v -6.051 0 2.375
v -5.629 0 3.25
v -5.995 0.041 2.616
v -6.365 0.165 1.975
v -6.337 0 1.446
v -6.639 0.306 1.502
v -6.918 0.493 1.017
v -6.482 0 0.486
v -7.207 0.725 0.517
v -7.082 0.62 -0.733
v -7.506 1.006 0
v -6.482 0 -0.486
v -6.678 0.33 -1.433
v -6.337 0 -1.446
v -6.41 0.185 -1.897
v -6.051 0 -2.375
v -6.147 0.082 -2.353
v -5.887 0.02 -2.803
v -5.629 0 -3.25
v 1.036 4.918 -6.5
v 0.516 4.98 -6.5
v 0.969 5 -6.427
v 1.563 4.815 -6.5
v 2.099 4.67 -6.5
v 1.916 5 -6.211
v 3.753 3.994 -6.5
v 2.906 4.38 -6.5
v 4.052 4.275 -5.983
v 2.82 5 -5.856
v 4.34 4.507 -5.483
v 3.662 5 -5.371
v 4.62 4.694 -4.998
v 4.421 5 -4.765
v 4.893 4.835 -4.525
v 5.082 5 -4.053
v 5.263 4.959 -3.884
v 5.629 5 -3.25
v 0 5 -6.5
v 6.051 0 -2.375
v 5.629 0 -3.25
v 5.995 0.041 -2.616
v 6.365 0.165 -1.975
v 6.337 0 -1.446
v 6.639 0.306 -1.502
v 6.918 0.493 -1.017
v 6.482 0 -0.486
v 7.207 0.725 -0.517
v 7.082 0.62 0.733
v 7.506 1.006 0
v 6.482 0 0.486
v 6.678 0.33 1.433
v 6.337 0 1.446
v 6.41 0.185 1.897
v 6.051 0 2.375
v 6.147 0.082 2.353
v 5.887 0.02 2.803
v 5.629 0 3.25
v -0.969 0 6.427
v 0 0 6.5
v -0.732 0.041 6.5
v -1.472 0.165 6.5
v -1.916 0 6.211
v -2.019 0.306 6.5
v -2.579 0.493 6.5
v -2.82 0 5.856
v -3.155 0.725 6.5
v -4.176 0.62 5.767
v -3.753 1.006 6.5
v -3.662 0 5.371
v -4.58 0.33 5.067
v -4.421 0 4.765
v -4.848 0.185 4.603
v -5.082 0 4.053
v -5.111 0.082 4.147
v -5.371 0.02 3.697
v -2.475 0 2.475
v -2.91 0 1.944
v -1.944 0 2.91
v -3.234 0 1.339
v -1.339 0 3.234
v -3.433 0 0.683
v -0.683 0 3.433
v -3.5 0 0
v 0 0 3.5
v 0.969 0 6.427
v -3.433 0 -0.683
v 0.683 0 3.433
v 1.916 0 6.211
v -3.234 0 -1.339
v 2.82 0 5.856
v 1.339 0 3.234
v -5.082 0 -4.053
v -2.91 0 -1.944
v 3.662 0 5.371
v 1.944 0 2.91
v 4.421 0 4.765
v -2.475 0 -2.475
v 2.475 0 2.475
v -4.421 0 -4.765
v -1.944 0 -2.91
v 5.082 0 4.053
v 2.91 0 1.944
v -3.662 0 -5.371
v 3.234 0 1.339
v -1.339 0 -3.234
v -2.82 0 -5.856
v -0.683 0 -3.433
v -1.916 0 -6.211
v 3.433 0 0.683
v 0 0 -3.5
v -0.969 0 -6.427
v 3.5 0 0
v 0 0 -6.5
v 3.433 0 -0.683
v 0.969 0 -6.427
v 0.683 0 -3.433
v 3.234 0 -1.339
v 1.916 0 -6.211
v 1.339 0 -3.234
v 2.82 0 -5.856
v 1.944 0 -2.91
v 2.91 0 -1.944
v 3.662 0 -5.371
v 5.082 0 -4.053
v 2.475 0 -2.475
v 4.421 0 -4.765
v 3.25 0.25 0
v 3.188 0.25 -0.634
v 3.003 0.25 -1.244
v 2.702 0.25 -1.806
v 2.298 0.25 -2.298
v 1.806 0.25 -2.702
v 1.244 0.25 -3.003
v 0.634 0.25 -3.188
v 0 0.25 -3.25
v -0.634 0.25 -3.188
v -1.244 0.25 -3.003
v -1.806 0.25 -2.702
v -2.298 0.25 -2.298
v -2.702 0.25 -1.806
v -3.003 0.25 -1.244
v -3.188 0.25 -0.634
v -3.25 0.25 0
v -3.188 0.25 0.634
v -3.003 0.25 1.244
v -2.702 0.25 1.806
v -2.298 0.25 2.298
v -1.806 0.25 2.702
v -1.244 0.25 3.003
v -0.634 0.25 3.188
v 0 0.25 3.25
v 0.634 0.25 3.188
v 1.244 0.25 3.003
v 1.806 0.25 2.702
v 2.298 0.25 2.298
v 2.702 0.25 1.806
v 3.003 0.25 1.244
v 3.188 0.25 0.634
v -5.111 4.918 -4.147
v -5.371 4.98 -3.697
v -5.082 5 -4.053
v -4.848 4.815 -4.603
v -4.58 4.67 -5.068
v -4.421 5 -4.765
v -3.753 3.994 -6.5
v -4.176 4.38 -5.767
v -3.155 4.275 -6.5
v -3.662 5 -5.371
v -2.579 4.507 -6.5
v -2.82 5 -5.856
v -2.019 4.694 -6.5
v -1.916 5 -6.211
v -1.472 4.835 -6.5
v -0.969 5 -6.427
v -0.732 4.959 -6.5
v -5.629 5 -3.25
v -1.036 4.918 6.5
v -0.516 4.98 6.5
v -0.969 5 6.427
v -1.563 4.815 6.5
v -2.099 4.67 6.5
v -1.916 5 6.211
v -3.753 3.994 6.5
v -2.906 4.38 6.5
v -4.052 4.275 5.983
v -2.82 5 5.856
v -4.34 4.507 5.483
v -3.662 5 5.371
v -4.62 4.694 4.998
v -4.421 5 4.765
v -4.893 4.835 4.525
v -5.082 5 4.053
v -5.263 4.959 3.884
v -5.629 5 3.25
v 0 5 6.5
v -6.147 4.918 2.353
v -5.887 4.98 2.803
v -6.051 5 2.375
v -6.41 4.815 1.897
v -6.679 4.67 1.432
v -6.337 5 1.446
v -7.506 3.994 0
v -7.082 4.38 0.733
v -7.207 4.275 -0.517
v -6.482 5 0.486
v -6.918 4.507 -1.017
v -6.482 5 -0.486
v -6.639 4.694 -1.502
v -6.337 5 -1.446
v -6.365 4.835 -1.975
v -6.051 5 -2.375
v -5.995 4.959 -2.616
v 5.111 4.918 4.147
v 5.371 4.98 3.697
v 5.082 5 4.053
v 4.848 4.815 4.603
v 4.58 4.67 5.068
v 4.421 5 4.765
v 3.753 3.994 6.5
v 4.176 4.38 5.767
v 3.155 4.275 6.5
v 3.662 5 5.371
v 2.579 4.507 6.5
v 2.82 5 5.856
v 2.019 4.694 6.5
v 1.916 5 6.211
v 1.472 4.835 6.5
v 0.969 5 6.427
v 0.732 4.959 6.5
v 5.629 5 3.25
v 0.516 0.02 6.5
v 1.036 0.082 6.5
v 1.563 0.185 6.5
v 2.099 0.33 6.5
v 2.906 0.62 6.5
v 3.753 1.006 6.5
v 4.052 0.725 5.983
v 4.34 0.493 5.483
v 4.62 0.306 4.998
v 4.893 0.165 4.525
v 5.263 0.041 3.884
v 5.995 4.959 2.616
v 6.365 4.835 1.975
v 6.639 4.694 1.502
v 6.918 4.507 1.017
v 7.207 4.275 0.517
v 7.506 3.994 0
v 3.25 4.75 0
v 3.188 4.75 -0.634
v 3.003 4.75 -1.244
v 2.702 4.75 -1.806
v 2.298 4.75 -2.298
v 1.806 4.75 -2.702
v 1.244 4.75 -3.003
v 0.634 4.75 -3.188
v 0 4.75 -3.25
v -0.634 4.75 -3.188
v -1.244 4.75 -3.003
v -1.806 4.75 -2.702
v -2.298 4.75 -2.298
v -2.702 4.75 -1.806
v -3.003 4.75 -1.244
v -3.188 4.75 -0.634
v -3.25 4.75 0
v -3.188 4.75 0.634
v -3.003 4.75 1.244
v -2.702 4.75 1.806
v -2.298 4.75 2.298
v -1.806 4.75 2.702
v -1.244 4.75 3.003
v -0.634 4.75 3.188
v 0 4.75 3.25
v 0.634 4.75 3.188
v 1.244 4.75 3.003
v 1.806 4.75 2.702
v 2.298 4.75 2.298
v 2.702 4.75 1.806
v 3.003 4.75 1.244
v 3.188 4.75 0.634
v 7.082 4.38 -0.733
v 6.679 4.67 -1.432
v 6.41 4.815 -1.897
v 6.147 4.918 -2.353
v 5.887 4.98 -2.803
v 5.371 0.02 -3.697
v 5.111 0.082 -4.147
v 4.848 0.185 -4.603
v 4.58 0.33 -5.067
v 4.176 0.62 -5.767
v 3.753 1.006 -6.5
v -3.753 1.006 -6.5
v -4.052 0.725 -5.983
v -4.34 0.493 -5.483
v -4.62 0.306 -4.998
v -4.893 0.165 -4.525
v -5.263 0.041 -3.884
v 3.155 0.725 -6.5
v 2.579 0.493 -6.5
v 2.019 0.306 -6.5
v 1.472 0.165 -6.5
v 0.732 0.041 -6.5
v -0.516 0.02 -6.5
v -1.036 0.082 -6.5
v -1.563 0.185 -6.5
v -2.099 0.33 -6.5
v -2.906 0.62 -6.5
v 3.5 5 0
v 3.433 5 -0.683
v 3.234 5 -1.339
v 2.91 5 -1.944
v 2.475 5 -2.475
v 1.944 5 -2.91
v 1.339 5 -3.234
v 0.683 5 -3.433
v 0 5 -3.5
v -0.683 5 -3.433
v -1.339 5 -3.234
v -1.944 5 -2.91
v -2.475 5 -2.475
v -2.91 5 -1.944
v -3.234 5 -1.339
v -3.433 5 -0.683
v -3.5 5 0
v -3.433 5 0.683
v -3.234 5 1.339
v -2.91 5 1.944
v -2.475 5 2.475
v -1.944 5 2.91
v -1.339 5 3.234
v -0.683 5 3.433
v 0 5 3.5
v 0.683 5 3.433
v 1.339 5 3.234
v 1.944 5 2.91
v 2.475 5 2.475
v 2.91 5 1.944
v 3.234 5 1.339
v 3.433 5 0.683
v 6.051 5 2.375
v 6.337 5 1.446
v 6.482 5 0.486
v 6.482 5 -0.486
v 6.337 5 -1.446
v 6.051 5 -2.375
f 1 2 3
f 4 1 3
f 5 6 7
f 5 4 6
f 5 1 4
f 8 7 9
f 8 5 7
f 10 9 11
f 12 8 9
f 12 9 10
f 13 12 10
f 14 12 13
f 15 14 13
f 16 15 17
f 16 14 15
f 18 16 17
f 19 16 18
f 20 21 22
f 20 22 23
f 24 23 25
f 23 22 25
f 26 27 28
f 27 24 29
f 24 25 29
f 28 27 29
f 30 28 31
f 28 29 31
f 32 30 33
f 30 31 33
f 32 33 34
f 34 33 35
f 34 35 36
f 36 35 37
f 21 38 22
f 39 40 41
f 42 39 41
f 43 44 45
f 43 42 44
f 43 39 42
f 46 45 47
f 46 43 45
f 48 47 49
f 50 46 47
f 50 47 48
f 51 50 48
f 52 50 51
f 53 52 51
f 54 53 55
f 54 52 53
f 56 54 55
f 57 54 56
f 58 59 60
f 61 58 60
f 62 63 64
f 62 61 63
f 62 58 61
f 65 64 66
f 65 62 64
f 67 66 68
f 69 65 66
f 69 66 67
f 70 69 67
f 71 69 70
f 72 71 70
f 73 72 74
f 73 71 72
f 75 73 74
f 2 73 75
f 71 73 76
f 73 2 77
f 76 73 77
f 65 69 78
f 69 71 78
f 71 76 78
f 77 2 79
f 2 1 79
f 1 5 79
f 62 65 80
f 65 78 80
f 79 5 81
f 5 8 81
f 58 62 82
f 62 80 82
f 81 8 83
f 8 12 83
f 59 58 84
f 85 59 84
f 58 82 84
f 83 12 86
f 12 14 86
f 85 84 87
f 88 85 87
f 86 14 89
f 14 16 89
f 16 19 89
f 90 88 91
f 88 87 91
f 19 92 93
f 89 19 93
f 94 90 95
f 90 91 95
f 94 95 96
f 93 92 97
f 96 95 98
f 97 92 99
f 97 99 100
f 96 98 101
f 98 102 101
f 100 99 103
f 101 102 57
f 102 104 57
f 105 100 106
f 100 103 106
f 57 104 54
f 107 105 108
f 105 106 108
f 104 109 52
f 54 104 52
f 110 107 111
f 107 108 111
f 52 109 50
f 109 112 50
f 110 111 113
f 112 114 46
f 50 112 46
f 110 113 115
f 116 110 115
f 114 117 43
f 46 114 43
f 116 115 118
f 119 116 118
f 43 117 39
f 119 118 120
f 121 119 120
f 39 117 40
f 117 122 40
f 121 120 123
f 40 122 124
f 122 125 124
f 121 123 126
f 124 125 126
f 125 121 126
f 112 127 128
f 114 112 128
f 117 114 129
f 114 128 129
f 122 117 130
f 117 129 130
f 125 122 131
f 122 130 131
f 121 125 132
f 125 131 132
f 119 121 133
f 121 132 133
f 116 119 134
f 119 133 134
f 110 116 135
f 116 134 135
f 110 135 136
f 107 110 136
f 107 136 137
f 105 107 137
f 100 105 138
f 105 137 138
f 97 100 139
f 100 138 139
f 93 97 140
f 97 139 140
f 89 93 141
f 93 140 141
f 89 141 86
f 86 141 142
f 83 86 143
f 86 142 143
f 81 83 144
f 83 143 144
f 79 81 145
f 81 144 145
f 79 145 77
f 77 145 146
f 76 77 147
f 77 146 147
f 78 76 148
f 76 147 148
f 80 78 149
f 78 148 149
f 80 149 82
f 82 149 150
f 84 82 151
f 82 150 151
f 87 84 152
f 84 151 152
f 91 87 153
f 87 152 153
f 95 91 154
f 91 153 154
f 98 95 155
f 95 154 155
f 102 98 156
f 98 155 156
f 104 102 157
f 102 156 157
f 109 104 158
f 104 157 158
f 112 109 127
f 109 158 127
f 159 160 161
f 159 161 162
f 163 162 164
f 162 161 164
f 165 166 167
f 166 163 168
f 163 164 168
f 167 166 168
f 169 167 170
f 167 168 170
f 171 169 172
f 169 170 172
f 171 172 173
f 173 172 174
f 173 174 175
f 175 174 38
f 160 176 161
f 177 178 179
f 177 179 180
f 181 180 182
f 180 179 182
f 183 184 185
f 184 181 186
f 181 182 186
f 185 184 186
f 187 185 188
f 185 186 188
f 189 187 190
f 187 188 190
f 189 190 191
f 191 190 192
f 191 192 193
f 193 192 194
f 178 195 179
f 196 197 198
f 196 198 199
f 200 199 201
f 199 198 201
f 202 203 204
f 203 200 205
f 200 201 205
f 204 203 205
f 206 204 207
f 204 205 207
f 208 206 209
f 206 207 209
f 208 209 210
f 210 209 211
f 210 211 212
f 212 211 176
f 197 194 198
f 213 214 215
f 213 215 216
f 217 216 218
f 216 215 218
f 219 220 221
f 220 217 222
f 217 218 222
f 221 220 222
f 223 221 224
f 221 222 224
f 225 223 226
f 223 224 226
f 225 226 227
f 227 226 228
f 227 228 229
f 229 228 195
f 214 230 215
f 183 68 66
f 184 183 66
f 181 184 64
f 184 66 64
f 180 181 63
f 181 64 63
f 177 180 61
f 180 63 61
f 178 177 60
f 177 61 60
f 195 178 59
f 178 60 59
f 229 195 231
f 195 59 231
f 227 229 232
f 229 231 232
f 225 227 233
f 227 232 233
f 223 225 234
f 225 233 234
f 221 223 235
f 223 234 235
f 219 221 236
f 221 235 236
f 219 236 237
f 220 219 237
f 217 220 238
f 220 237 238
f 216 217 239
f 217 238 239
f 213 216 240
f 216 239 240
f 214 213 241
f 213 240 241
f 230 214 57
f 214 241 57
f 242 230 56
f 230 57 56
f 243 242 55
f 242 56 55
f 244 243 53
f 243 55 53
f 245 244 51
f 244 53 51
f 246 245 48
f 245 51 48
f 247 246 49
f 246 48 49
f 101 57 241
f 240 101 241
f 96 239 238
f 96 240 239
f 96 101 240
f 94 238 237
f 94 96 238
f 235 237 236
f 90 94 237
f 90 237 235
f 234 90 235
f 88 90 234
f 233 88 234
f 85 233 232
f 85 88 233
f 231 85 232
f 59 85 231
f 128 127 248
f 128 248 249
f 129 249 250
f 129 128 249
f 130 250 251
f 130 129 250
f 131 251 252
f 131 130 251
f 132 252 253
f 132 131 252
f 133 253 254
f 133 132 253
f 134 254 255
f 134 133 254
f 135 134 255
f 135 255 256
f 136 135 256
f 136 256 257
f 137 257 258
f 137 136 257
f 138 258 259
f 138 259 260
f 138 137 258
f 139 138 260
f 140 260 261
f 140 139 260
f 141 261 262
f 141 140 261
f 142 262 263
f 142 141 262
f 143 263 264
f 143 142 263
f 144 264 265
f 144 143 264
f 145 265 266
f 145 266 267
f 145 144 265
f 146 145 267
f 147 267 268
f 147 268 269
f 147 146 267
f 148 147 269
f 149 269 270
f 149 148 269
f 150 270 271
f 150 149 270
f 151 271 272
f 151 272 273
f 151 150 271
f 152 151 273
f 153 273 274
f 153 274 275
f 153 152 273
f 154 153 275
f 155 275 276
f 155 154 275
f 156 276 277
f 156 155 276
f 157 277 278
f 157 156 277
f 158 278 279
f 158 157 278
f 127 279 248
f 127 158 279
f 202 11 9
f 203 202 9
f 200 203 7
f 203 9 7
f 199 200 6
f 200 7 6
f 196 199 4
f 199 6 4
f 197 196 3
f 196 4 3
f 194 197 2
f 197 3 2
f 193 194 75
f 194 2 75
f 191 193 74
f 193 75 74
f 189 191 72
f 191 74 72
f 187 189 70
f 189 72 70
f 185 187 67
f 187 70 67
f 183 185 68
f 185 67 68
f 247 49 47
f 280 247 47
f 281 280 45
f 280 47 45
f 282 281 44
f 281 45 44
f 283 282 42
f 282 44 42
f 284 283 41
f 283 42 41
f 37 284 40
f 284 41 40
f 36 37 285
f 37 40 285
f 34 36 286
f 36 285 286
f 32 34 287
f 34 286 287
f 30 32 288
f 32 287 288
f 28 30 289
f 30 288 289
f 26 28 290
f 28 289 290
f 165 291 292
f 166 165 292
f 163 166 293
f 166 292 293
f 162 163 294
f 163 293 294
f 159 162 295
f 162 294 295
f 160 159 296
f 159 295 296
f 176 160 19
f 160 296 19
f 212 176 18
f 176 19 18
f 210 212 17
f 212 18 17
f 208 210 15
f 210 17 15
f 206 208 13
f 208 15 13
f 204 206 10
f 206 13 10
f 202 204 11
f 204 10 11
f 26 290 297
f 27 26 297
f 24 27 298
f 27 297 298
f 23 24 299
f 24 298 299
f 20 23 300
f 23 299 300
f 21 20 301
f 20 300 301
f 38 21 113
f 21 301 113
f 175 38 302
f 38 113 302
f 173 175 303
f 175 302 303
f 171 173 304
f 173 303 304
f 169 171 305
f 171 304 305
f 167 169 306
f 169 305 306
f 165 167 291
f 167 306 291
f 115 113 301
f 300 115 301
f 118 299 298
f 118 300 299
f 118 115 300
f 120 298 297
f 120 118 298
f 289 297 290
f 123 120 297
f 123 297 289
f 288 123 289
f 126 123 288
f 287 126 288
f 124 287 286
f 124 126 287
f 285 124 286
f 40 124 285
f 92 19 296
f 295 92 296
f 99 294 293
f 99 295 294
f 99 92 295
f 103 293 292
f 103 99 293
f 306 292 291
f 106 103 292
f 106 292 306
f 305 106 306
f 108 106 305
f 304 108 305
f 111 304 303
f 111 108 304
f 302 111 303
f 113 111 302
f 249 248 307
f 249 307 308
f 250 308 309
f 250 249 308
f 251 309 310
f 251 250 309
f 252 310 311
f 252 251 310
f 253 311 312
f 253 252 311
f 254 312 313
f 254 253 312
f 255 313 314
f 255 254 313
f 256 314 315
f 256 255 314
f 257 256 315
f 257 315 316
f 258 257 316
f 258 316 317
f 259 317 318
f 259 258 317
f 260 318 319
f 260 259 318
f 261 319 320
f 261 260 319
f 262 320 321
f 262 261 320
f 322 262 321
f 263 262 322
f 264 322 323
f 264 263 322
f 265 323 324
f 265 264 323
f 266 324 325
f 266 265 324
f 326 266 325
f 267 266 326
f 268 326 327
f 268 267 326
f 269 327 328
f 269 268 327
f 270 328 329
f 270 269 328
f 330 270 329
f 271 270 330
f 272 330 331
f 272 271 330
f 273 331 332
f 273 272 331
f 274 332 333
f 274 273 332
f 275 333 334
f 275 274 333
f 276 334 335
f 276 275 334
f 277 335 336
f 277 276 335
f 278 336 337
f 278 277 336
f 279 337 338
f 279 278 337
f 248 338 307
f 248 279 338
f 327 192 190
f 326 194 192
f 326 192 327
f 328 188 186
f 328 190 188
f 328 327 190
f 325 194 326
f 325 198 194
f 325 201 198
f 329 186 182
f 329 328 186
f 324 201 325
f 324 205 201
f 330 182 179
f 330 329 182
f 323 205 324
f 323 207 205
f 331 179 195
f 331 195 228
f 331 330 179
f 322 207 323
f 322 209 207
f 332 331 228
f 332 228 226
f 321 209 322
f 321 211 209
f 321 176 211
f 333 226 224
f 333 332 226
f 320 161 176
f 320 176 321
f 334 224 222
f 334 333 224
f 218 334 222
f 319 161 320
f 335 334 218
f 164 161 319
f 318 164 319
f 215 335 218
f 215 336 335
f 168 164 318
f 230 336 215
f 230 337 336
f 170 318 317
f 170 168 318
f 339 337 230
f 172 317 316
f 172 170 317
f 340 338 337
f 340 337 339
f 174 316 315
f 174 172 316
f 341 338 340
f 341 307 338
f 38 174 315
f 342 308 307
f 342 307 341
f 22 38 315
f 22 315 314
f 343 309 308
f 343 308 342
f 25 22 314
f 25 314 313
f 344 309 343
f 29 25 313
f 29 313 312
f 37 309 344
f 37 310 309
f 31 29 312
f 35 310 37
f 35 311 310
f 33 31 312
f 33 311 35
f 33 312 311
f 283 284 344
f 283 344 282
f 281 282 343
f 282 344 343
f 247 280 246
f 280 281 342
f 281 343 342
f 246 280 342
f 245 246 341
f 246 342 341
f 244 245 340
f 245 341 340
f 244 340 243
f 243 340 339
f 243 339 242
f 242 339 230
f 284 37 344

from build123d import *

# Parameters (mm, degrees)
SKETCH1_R           = 3.25
BOSS_EXTRUDE1_DEPTH = 5
CHAMFER2_SIZE       = 0.25


with BuildPart() as part:
    # Sketch1 → Boss-Extrude1 (new body)
    with BuildSketch(Plane(origin=(0, 0, 0), x_dir=(1, 0, 0), z_dir=(0, 1, 0))):
        Polygon((3.75277675, -6.5), (7.505553499, 0), (3.75277675, 6.5), (-3.75277675, 6.5), (-7.505553499, 0), (-3.75277675, -6.5), align=None)
        Circle(SKETCH1_R, mode=Mode.SUBTRACT)
    extrude(amount=BOSS_EXTRUDE1_DEPTH)

    # Sketch2 → Cut-Revolve1 (revolve, cut)
    with BuildSketch(Plane(origin=(0, 0, 0), x_dir=(0, 0, -1), z_dir=(1, 0, 0))):
        Polygon((6.5, 5), (7.55, 6.05), (7.55, 3.95), align=None)
        Polygon((7.55, 1.05), (6.5, 0), (7.55, -1.05), align=None)
    revolve(axis=Axis((0, 5, 0), (0, -1, 0)), mode=Mode.SUBTRACT)

    # Chamfer2
    chamfer2_edges = [part.edges().sort_by_distance(p)[0] for p in [
        (-3.25, 5, 0),
        (-3.25, 0, 0),
    ]]
    chamfer(chamfer2_edges, length=CHAMFER2_SIZE)


solid = part.part
